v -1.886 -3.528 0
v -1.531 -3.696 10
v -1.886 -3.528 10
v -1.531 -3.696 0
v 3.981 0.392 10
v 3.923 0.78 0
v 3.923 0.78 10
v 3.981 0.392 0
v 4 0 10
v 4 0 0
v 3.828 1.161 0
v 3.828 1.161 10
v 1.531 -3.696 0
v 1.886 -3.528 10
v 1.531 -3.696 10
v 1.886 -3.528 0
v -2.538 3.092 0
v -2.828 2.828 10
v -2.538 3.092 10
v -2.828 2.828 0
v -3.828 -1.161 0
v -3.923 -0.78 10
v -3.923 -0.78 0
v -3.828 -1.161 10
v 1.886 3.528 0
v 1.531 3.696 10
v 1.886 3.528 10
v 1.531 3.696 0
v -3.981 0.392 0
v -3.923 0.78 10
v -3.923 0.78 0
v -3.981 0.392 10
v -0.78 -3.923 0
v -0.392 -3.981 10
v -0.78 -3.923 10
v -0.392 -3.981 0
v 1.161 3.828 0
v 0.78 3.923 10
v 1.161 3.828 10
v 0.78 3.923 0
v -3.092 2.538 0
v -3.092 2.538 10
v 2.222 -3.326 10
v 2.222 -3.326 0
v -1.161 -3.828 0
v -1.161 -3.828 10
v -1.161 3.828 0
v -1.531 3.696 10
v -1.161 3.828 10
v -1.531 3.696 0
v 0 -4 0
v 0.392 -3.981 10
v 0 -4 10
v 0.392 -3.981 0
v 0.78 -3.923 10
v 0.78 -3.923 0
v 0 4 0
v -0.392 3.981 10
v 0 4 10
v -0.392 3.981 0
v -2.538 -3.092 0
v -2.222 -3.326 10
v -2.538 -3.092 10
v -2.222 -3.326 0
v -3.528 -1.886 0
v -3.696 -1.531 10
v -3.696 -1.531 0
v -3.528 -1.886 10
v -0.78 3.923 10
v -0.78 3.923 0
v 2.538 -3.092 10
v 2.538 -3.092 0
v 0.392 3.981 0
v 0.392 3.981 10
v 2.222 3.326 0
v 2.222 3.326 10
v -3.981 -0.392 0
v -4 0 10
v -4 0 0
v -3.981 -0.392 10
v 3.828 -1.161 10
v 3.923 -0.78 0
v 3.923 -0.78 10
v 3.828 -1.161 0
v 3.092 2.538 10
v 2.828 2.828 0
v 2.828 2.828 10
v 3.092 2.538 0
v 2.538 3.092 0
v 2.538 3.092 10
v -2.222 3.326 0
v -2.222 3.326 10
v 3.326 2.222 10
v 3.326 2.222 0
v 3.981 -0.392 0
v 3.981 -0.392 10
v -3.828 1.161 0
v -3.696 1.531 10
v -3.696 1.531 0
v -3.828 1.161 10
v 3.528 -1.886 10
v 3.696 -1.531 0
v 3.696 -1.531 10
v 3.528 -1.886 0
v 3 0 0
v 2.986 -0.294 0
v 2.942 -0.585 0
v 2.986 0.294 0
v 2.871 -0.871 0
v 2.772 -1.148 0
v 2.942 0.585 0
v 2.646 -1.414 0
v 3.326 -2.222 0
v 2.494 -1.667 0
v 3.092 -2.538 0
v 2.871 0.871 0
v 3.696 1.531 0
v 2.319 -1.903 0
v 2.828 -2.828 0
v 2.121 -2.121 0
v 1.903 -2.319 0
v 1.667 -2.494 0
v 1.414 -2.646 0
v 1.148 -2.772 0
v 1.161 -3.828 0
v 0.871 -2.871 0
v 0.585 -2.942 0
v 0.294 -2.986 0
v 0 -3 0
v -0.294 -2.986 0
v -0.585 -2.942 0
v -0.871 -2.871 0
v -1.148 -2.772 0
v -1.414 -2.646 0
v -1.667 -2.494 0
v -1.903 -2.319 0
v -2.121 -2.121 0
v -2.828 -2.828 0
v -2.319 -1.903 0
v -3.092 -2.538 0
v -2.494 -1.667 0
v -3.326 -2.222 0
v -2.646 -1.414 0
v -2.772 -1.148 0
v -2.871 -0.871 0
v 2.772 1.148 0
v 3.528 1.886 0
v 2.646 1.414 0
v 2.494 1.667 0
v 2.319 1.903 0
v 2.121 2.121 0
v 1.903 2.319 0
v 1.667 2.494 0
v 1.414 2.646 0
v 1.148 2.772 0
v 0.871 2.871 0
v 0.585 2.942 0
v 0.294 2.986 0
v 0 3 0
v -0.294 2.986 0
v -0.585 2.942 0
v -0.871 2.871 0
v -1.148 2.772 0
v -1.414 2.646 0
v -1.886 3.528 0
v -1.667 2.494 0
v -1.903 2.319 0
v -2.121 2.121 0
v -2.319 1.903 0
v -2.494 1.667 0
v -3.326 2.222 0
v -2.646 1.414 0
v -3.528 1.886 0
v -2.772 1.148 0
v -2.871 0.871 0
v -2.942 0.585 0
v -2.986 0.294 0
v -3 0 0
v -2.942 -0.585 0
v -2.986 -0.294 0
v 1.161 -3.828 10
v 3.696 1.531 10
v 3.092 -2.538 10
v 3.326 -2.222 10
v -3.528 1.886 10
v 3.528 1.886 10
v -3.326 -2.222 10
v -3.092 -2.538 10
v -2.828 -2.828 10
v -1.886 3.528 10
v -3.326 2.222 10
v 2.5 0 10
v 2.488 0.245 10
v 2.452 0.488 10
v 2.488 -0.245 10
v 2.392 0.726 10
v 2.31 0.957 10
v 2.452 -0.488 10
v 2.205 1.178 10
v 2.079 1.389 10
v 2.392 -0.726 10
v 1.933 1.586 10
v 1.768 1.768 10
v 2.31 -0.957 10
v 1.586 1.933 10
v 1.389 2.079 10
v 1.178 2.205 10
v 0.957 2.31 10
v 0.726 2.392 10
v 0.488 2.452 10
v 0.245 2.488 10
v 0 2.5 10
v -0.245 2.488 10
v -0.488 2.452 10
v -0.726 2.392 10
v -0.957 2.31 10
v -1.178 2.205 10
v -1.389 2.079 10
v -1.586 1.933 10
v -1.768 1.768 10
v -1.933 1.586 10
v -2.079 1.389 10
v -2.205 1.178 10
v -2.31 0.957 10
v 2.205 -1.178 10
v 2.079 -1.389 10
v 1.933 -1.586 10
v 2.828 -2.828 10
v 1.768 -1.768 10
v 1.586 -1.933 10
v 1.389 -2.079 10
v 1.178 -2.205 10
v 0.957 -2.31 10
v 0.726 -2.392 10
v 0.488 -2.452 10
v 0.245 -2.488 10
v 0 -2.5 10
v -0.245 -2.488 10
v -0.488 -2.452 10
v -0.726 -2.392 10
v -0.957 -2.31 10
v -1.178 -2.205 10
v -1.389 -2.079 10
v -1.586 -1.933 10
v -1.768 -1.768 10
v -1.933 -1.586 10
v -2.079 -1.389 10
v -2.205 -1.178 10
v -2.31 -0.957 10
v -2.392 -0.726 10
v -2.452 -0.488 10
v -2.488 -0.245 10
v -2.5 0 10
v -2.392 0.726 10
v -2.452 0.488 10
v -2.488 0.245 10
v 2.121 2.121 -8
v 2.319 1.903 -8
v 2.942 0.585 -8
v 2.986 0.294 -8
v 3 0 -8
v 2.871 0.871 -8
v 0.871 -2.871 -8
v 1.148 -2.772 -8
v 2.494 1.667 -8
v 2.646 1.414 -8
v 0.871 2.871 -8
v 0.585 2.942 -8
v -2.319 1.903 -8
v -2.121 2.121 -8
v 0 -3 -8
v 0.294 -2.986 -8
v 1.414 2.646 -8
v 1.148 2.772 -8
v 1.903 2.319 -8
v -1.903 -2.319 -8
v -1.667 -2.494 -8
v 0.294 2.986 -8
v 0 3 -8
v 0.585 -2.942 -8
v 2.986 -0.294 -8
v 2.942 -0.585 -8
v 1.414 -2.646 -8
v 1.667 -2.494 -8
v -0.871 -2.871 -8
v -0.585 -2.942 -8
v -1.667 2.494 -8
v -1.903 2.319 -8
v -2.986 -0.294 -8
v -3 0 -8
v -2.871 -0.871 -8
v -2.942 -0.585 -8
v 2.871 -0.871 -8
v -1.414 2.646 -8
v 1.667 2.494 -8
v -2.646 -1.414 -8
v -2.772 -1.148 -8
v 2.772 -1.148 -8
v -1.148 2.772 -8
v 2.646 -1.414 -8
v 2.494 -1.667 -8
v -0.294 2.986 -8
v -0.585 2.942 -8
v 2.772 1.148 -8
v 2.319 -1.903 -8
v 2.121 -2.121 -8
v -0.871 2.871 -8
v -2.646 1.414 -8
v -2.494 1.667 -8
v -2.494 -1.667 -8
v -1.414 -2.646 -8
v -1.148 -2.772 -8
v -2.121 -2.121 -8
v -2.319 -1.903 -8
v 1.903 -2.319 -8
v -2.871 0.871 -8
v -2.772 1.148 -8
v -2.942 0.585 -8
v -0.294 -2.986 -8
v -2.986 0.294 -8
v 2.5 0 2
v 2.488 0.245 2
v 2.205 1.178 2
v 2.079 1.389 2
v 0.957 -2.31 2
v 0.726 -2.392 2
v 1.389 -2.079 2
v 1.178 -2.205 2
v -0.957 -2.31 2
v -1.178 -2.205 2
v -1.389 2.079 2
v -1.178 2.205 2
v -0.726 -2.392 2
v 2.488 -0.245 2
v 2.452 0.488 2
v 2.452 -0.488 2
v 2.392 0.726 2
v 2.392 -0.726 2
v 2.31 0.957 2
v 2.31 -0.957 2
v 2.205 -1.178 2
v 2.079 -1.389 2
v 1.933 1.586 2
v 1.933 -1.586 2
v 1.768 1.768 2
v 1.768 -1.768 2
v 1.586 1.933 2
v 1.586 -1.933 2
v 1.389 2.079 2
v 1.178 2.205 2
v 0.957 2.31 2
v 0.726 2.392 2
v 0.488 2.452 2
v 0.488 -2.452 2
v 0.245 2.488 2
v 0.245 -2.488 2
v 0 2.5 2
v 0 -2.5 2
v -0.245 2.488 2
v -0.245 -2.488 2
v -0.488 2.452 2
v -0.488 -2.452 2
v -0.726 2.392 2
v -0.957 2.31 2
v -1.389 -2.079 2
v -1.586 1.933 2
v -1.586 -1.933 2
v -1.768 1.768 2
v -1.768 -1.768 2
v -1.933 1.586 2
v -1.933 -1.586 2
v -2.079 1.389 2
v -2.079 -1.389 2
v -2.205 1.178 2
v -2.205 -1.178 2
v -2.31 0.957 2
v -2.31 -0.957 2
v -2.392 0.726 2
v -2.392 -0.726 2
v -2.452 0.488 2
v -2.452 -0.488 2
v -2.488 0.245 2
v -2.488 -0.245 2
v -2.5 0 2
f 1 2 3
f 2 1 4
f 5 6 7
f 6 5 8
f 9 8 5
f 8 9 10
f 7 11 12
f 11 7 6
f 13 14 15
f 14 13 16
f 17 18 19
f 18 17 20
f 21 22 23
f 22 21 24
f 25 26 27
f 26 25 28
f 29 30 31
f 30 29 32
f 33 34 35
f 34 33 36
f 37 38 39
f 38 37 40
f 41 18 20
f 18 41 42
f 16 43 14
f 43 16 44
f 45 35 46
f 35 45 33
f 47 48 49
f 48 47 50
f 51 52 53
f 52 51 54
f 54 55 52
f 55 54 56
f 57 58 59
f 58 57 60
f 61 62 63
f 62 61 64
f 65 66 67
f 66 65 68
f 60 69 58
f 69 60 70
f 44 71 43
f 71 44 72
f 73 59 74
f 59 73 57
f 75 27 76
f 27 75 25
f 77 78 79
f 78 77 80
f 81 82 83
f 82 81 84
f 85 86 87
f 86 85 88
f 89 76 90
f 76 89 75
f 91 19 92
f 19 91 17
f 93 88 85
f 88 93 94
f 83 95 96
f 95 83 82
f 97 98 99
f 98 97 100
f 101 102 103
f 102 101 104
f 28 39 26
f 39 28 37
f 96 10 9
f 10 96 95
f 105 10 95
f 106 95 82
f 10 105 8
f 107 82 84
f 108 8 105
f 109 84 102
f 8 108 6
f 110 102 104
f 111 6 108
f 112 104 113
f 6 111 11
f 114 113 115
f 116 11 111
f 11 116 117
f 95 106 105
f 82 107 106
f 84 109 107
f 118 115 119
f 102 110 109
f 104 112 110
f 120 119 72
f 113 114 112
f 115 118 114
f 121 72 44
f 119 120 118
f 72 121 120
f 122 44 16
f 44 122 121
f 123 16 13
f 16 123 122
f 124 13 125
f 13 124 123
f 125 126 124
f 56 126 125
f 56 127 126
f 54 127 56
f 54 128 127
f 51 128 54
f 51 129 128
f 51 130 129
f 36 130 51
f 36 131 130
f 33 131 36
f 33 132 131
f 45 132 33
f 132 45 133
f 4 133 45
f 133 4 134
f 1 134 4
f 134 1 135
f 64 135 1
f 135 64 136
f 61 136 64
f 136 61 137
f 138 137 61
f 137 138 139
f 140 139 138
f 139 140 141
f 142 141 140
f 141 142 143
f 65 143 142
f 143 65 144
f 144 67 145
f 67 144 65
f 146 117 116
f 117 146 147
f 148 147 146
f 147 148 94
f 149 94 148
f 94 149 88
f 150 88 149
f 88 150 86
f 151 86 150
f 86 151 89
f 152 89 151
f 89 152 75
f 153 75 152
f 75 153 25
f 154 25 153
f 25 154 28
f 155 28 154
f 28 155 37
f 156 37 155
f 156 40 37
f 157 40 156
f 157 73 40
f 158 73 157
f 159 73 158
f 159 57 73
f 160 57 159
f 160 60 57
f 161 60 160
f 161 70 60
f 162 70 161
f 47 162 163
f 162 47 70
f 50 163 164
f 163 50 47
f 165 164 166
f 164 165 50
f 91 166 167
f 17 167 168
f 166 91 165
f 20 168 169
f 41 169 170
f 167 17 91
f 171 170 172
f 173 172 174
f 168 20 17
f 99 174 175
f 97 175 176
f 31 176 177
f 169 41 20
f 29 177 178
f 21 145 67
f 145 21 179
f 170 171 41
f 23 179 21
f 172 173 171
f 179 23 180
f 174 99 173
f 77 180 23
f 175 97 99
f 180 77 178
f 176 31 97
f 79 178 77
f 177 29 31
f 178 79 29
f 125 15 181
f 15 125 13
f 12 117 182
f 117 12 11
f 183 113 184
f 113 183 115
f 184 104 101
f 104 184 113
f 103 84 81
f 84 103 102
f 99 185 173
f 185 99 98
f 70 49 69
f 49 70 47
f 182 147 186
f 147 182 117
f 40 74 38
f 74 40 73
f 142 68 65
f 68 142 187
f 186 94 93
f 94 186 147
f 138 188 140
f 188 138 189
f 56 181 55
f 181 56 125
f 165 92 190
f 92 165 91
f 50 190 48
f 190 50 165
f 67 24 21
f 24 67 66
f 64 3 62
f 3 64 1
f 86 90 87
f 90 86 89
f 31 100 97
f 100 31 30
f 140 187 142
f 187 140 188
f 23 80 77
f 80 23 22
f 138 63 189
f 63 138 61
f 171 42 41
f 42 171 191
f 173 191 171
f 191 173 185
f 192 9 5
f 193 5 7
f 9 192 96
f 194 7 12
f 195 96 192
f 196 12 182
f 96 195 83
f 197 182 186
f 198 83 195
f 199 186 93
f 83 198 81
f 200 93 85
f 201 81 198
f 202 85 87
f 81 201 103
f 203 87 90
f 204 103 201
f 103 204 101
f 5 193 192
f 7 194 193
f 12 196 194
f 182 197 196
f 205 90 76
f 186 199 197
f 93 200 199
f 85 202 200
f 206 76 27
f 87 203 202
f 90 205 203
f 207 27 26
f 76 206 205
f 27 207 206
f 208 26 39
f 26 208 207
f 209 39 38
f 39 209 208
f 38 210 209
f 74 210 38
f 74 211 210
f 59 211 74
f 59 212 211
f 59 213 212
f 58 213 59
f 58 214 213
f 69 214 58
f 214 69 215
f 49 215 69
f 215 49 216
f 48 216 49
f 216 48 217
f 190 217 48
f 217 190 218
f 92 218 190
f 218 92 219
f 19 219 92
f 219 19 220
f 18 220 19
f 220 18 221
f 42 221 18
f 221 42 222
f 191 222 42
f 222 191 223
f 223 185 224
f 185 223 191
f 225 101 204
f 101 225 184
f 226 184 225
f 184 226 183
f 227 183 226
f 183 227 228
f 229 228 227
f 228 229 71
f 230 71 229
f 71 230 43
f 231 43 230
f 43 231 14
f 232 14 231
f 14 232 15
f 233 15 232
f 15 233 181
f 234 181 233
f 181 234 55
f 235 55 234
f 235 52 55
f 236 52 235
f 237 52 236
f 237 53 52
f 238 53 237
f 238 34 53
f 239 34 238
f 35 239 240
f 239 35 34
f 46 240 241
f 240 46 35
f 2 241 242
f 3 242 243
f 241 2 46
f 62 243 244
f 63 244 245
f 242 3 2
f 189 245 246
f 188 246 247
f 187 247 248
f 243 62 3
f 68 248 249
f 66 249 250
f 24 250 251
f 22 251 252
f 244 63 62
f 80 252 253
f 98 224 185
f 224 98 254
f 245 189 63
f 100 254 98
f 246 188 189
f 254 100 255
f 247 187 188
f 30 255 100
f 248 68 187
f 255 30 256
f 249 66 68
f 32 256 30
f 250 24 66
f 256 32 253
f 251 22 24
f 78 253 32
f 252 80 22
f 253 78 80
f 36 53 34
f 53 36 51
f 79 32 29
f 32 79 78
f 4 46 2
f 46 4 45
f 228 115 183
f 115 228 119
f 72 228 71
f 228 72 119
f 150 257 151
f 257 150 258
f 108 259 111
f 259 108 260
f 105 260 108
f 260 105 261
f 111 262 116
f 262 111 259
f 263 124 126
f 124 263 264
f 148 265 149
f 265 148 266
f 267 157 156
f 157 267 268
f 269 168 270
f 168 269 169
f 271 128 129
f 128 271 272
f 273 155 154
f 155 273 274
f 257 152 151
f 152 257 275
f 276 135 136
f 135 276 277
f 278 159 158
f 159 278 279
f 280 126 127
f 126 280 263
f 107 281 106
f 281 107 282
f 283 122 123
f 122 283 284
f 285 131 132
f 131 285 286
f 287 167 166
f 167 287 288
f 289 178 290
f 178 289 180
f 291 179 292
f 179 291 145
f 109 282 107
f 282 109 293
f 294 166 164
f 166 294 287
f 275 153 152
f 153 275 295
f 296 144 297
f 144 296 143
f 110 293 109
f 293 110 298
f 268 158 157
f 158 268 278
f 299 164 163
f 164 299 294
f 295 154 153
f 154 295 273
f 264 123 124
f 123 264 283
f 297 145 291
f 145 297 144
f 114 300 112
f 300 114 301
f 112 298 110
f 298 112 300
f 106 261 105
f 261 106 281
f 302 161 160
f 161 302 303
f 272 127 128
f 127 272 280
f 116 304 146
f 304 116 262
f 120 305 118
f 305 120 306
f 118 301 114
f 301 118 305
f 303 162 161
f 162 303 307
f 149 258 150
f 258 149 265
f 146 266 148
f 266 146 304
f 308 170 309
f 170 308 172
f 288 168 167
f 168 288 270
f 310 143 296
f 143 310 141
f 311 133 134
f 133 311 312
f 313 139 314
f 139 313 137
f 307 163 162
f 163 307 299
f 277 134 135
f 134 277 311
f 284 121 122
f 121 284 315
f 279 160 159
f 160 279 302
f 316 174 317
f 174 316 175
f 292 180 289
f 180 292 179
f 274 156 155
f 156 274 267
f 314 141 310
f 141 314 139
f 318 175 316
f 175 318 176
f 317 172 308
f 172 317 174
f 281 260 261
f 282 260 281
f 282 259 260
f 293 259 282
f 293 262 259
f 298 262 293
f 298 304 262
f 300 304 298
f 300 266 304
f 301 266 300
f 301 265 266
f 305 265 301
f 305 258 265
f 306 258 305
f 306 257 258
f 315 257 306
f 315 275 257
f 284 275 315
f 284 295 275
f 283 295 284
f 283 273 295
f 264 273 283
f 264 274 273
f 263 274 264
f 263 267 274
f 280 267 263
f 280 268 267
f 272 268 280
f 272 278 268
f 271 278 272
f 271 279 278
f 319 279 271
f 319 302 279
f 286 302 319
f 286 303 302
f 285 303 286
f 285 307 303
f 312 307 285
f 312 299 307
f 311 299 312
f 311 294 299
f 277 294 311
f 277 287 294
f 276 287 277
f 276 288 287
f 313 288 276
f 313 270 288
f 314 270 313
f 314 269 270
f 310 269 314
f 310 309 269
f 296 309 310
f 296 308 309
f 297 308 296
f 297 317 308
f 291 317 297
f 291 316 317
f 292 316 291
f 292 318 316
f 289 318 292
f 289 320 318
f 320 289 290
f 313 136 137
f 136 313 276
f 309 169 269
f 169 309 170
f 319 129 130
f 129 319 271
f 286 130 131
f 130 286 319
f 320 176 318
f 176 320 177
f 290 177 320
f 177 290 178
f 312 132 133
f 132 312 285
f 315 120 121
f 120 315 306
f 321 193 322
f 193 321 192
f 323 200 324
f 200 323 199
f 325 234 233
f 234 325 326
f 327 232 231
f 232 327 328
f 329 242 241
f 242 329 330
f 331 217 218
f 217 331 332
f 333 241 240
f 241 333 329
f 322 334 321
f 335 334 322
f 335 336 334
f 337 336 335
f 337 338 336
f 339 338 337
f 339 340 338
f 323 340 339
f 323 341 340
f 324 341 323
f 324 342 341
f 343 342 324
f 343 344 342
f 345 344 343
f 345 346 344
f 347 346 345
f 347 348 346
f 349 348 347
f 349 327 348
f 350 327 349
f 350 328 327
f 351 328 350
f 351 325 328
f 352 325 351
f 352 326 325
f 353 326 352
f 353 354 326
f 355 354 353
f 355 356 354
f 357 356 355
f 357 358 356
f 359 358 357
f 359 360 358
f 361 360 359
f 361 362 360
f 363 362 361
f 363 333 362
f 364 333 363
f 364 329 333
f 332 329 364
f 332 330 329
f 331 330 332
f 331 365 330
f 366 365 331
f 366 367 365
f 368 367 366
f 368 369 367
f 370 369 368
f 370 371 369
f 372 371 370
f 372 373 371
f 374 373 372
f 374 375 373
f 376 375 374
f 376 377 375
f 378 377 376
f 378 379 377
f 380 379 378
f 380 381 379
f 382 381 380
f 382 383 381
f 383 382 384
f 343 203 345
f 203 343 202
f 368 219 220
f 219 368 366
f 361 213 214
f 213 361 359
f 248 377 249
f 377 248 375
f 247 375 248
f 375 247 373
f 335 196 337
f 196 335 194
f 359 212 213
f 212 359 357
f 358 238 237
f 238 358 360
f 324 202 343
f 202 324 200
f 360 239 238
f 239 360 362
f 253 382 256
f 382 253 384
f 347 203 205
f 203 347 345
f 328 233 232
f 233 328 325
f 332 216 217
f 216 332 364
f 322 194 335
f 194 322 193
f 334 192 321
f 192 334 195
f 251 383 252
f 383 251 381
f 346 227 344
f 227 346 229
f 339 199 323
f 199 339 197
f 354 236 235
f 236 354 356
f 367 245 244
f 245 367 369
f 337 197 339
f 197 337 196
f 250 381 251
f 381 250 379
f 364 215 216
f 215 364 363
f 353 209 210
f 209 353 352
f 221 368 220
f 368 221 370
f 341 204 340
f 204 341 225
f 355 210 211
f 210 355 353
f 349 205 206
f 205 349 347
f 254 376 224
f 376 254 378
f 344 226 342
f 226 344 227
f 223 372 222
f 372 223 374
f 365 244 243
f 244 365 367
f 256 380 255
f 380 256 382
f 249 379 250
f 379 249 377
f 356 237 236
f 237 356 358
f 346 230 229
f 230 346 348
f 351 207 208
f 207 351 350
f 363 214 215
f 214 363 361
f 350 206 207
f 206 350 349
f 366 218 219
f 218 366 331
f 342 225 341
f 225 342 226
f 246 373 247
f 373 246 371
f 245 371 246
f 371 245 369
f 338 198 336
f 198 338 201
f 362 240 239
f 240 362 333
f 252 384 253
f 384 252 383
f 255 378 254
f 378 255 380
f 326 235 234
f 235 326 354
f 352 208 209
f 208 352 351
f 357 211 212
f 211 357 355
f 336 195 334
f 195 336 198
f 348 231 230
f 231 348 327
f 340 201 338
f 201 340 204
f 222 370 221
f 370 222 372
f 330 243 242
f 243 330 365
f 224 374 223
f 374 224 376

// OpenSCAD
// M6 male-female standoff (spacer)
// Body: 8mm OD, 10mm tall, M6 female thread inside
// Stud: M6 male thread, 6mm OD, 8mm long, below body

body_od      = 8.0;
body_h       = 10.0;
stud_d       = 6.0;
stud_h       = 8.0;
thread_d     = 5.0;
thread_depth = 8.0;

$fn = 64;

module spacer() {
    difference() {
        union() {
            cylinder(h = body_h, d = body_od);
            translate([0, 0, -stud_h])
                cylinder(h = stud_h, d = stud_d);
        }
        translate([0, 0, body_h - thread_depth])
            cylinder(h = thread_depth + 0.1, d = thread_d);
    }
}

spacer();
